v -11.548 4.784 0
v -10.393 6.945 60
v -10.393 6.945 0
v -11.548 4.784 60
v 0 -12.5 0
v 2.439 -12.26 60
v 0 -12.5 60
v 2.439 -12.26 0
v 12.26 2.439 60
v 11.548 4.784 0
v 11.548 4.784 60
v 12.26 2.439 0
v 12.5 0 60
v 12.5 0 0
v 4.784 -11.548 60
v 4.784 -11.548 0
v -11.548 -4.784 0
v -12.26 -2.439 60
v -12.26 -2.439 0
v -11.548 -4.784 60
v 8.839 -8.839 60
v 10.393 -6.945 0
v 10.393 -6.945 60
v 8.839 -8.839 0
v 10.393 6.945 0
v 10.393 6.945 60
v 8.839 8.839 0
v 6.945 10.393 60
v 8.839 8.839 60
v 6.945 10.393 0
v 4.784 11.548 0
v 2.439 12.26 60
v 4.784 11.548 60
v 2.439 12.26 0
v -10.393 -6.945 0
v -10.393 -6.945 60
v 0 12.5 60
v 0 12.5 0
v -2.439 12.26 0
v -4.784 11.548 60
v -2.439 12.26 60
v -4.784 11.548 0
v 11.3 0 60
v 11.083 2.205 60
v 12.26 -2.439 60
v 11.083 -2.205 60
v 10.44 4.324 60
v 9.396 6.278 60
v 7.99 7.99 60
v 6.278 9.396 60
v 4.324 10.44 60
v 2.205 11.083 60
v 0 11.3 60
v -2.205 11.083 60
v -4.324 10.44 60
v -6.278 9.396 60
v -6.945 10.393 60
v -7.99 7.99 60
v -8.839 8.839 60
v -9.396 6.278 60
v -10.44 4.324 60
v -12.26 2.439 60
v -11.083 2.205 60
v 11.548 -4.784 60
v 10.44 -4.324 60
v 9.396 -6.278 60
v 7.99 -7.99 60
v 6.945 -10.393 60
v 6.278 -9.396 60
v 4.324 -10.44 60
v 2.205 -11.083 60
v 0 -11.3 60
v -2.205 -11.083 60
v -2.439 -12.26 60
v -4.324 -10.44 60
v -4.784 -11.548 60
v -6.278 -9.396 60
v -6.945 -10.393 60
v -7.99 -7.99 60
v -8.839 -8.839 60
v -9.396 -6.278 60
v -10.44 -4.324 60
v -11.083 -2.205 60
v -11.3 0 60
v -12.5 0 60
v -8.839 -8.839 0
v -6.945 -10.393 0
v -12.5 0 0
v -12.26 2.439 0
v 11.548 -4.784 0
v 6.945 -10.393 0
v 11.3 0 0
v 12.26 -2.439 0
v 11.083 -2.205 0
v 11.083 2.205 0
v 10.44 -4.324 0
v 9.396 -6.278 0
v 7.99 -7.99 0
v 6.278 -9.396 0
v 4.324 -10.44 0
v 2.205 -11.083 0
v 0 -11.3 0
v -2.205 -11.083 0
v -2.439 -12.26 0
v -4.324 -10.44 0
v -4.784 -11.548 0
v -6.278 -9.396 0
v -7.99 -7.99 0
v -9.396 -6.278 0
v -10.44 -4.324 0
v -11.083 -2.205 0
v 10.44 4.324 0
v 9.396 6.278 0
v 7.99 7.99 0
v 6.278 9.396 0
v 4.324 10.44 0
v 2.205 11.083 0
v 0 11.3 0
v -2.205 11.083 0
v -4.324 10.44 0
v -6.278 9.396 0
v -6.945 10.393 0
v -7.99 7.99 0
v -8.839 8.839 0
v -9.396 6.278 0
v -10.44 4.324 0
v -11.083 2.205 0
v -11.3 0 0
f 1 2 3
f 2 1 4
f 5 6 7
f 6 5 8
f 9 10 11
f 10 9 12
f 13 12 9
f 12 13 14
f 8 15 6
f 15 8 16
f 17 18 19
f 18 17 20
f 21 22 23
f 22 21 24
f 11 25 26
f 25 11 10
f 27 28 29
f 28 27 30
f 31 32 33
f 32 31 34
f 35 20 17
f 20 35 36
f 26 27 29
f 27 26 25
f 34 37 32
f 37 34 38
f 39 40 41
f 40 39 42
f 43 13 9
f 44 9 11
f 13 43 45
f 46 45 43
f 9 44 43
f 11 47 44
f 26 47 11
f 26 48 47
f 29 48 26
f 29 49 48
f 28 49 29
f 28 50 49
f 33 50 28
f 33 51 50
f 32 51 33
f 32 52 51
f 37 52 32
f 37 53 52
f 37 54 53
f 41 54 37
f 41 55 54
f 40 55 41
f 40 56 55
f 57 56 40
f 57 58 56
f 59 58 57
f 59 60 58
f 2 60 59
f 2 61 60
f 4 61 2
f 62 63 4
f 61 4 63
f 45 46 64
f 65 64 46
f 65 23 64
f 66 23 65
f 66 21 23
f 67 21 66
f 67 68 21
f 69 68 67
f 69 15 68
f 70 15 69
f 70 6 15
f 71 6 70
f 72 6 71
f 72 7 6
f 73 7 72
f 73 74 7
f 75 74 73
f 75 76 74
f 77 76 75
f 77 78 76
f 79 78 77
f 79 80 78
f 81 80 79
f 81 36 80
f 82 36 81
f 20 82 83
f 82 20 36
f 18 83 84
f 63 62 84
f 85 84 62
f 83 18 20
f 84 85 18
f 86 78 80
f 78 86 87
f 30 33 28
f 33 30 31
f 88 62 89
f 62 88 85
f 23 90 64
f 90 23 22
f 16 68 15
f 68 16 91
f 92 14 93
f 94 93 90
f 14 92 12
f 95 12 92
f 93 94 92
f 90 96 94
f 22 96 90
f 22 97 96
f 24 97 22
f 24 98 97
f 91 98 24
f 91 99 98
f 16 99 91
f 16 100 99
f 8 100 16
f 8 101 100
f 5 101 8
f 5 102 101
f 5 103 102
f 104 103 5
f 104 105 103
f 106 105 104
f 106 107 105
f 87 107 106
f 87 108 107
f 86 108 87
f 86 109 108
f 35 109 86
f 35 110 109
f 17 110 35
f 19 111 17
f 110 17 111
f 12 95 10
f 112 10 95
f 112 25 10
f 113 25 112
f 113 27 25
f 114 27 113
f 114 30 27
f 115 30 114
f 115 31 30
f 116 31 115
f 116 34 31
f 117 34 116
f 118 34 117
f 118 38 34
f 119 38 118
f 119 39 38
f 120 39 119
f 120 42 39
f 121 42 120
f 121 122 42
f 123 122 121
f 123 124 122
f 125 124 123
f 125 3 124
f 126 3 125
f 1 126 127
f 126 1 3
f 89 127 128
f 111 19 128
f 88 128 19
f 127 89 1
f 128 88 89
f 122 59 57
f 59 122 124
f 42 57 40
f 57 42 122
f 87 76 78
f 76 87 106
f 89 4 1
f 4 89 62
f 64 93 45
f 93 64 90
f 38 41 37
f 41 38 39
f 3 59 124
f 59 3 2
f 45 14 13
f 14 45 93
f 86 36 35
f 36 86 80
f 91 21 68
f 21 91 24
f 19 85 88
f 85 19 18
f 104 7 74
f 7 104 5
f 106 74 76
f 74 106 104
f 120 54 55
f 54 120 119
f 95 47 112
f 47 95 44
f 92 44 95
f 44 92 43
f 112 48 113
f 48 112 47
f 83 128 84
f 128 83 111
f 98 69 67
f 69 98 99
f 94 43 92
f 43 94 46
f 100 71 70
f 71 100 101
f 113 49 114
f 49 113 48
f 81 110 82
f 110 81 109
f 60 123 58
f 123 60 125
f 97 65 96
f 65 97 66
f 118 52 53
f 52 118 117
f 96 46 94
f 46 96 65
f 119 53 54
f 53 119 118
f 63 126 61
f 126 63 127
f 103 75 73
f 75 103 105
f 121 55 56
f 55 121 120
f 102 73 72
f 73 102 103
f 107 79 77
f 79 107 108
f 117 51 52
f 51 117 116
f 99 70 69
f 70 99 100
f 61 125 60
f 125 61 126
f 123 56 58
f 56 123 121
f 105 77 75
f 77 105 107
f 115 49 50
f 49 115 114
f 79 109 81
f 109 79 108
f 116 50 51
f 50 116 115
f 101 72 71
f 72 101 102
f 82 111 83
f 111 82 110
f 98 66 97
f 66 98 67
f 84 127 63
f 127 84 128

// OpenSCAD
$fn = 32;

// ----------------------------------------------------------------------
// Thin tube: 1.2 mm wall
// ----------------------------------------------------------------------

// --- parameters (mm) ---
tube_od = 25;             // outer diameter
tube_h = 60;              // height, Z
wall = 1.2;               // wall thickness

difference() {
  cylinder(h = tube_h, d = tube_od);
  translate([0, 0, -1]) cylinder(h = tube_h + 2, d = tube_od - 2 * wall);
}
